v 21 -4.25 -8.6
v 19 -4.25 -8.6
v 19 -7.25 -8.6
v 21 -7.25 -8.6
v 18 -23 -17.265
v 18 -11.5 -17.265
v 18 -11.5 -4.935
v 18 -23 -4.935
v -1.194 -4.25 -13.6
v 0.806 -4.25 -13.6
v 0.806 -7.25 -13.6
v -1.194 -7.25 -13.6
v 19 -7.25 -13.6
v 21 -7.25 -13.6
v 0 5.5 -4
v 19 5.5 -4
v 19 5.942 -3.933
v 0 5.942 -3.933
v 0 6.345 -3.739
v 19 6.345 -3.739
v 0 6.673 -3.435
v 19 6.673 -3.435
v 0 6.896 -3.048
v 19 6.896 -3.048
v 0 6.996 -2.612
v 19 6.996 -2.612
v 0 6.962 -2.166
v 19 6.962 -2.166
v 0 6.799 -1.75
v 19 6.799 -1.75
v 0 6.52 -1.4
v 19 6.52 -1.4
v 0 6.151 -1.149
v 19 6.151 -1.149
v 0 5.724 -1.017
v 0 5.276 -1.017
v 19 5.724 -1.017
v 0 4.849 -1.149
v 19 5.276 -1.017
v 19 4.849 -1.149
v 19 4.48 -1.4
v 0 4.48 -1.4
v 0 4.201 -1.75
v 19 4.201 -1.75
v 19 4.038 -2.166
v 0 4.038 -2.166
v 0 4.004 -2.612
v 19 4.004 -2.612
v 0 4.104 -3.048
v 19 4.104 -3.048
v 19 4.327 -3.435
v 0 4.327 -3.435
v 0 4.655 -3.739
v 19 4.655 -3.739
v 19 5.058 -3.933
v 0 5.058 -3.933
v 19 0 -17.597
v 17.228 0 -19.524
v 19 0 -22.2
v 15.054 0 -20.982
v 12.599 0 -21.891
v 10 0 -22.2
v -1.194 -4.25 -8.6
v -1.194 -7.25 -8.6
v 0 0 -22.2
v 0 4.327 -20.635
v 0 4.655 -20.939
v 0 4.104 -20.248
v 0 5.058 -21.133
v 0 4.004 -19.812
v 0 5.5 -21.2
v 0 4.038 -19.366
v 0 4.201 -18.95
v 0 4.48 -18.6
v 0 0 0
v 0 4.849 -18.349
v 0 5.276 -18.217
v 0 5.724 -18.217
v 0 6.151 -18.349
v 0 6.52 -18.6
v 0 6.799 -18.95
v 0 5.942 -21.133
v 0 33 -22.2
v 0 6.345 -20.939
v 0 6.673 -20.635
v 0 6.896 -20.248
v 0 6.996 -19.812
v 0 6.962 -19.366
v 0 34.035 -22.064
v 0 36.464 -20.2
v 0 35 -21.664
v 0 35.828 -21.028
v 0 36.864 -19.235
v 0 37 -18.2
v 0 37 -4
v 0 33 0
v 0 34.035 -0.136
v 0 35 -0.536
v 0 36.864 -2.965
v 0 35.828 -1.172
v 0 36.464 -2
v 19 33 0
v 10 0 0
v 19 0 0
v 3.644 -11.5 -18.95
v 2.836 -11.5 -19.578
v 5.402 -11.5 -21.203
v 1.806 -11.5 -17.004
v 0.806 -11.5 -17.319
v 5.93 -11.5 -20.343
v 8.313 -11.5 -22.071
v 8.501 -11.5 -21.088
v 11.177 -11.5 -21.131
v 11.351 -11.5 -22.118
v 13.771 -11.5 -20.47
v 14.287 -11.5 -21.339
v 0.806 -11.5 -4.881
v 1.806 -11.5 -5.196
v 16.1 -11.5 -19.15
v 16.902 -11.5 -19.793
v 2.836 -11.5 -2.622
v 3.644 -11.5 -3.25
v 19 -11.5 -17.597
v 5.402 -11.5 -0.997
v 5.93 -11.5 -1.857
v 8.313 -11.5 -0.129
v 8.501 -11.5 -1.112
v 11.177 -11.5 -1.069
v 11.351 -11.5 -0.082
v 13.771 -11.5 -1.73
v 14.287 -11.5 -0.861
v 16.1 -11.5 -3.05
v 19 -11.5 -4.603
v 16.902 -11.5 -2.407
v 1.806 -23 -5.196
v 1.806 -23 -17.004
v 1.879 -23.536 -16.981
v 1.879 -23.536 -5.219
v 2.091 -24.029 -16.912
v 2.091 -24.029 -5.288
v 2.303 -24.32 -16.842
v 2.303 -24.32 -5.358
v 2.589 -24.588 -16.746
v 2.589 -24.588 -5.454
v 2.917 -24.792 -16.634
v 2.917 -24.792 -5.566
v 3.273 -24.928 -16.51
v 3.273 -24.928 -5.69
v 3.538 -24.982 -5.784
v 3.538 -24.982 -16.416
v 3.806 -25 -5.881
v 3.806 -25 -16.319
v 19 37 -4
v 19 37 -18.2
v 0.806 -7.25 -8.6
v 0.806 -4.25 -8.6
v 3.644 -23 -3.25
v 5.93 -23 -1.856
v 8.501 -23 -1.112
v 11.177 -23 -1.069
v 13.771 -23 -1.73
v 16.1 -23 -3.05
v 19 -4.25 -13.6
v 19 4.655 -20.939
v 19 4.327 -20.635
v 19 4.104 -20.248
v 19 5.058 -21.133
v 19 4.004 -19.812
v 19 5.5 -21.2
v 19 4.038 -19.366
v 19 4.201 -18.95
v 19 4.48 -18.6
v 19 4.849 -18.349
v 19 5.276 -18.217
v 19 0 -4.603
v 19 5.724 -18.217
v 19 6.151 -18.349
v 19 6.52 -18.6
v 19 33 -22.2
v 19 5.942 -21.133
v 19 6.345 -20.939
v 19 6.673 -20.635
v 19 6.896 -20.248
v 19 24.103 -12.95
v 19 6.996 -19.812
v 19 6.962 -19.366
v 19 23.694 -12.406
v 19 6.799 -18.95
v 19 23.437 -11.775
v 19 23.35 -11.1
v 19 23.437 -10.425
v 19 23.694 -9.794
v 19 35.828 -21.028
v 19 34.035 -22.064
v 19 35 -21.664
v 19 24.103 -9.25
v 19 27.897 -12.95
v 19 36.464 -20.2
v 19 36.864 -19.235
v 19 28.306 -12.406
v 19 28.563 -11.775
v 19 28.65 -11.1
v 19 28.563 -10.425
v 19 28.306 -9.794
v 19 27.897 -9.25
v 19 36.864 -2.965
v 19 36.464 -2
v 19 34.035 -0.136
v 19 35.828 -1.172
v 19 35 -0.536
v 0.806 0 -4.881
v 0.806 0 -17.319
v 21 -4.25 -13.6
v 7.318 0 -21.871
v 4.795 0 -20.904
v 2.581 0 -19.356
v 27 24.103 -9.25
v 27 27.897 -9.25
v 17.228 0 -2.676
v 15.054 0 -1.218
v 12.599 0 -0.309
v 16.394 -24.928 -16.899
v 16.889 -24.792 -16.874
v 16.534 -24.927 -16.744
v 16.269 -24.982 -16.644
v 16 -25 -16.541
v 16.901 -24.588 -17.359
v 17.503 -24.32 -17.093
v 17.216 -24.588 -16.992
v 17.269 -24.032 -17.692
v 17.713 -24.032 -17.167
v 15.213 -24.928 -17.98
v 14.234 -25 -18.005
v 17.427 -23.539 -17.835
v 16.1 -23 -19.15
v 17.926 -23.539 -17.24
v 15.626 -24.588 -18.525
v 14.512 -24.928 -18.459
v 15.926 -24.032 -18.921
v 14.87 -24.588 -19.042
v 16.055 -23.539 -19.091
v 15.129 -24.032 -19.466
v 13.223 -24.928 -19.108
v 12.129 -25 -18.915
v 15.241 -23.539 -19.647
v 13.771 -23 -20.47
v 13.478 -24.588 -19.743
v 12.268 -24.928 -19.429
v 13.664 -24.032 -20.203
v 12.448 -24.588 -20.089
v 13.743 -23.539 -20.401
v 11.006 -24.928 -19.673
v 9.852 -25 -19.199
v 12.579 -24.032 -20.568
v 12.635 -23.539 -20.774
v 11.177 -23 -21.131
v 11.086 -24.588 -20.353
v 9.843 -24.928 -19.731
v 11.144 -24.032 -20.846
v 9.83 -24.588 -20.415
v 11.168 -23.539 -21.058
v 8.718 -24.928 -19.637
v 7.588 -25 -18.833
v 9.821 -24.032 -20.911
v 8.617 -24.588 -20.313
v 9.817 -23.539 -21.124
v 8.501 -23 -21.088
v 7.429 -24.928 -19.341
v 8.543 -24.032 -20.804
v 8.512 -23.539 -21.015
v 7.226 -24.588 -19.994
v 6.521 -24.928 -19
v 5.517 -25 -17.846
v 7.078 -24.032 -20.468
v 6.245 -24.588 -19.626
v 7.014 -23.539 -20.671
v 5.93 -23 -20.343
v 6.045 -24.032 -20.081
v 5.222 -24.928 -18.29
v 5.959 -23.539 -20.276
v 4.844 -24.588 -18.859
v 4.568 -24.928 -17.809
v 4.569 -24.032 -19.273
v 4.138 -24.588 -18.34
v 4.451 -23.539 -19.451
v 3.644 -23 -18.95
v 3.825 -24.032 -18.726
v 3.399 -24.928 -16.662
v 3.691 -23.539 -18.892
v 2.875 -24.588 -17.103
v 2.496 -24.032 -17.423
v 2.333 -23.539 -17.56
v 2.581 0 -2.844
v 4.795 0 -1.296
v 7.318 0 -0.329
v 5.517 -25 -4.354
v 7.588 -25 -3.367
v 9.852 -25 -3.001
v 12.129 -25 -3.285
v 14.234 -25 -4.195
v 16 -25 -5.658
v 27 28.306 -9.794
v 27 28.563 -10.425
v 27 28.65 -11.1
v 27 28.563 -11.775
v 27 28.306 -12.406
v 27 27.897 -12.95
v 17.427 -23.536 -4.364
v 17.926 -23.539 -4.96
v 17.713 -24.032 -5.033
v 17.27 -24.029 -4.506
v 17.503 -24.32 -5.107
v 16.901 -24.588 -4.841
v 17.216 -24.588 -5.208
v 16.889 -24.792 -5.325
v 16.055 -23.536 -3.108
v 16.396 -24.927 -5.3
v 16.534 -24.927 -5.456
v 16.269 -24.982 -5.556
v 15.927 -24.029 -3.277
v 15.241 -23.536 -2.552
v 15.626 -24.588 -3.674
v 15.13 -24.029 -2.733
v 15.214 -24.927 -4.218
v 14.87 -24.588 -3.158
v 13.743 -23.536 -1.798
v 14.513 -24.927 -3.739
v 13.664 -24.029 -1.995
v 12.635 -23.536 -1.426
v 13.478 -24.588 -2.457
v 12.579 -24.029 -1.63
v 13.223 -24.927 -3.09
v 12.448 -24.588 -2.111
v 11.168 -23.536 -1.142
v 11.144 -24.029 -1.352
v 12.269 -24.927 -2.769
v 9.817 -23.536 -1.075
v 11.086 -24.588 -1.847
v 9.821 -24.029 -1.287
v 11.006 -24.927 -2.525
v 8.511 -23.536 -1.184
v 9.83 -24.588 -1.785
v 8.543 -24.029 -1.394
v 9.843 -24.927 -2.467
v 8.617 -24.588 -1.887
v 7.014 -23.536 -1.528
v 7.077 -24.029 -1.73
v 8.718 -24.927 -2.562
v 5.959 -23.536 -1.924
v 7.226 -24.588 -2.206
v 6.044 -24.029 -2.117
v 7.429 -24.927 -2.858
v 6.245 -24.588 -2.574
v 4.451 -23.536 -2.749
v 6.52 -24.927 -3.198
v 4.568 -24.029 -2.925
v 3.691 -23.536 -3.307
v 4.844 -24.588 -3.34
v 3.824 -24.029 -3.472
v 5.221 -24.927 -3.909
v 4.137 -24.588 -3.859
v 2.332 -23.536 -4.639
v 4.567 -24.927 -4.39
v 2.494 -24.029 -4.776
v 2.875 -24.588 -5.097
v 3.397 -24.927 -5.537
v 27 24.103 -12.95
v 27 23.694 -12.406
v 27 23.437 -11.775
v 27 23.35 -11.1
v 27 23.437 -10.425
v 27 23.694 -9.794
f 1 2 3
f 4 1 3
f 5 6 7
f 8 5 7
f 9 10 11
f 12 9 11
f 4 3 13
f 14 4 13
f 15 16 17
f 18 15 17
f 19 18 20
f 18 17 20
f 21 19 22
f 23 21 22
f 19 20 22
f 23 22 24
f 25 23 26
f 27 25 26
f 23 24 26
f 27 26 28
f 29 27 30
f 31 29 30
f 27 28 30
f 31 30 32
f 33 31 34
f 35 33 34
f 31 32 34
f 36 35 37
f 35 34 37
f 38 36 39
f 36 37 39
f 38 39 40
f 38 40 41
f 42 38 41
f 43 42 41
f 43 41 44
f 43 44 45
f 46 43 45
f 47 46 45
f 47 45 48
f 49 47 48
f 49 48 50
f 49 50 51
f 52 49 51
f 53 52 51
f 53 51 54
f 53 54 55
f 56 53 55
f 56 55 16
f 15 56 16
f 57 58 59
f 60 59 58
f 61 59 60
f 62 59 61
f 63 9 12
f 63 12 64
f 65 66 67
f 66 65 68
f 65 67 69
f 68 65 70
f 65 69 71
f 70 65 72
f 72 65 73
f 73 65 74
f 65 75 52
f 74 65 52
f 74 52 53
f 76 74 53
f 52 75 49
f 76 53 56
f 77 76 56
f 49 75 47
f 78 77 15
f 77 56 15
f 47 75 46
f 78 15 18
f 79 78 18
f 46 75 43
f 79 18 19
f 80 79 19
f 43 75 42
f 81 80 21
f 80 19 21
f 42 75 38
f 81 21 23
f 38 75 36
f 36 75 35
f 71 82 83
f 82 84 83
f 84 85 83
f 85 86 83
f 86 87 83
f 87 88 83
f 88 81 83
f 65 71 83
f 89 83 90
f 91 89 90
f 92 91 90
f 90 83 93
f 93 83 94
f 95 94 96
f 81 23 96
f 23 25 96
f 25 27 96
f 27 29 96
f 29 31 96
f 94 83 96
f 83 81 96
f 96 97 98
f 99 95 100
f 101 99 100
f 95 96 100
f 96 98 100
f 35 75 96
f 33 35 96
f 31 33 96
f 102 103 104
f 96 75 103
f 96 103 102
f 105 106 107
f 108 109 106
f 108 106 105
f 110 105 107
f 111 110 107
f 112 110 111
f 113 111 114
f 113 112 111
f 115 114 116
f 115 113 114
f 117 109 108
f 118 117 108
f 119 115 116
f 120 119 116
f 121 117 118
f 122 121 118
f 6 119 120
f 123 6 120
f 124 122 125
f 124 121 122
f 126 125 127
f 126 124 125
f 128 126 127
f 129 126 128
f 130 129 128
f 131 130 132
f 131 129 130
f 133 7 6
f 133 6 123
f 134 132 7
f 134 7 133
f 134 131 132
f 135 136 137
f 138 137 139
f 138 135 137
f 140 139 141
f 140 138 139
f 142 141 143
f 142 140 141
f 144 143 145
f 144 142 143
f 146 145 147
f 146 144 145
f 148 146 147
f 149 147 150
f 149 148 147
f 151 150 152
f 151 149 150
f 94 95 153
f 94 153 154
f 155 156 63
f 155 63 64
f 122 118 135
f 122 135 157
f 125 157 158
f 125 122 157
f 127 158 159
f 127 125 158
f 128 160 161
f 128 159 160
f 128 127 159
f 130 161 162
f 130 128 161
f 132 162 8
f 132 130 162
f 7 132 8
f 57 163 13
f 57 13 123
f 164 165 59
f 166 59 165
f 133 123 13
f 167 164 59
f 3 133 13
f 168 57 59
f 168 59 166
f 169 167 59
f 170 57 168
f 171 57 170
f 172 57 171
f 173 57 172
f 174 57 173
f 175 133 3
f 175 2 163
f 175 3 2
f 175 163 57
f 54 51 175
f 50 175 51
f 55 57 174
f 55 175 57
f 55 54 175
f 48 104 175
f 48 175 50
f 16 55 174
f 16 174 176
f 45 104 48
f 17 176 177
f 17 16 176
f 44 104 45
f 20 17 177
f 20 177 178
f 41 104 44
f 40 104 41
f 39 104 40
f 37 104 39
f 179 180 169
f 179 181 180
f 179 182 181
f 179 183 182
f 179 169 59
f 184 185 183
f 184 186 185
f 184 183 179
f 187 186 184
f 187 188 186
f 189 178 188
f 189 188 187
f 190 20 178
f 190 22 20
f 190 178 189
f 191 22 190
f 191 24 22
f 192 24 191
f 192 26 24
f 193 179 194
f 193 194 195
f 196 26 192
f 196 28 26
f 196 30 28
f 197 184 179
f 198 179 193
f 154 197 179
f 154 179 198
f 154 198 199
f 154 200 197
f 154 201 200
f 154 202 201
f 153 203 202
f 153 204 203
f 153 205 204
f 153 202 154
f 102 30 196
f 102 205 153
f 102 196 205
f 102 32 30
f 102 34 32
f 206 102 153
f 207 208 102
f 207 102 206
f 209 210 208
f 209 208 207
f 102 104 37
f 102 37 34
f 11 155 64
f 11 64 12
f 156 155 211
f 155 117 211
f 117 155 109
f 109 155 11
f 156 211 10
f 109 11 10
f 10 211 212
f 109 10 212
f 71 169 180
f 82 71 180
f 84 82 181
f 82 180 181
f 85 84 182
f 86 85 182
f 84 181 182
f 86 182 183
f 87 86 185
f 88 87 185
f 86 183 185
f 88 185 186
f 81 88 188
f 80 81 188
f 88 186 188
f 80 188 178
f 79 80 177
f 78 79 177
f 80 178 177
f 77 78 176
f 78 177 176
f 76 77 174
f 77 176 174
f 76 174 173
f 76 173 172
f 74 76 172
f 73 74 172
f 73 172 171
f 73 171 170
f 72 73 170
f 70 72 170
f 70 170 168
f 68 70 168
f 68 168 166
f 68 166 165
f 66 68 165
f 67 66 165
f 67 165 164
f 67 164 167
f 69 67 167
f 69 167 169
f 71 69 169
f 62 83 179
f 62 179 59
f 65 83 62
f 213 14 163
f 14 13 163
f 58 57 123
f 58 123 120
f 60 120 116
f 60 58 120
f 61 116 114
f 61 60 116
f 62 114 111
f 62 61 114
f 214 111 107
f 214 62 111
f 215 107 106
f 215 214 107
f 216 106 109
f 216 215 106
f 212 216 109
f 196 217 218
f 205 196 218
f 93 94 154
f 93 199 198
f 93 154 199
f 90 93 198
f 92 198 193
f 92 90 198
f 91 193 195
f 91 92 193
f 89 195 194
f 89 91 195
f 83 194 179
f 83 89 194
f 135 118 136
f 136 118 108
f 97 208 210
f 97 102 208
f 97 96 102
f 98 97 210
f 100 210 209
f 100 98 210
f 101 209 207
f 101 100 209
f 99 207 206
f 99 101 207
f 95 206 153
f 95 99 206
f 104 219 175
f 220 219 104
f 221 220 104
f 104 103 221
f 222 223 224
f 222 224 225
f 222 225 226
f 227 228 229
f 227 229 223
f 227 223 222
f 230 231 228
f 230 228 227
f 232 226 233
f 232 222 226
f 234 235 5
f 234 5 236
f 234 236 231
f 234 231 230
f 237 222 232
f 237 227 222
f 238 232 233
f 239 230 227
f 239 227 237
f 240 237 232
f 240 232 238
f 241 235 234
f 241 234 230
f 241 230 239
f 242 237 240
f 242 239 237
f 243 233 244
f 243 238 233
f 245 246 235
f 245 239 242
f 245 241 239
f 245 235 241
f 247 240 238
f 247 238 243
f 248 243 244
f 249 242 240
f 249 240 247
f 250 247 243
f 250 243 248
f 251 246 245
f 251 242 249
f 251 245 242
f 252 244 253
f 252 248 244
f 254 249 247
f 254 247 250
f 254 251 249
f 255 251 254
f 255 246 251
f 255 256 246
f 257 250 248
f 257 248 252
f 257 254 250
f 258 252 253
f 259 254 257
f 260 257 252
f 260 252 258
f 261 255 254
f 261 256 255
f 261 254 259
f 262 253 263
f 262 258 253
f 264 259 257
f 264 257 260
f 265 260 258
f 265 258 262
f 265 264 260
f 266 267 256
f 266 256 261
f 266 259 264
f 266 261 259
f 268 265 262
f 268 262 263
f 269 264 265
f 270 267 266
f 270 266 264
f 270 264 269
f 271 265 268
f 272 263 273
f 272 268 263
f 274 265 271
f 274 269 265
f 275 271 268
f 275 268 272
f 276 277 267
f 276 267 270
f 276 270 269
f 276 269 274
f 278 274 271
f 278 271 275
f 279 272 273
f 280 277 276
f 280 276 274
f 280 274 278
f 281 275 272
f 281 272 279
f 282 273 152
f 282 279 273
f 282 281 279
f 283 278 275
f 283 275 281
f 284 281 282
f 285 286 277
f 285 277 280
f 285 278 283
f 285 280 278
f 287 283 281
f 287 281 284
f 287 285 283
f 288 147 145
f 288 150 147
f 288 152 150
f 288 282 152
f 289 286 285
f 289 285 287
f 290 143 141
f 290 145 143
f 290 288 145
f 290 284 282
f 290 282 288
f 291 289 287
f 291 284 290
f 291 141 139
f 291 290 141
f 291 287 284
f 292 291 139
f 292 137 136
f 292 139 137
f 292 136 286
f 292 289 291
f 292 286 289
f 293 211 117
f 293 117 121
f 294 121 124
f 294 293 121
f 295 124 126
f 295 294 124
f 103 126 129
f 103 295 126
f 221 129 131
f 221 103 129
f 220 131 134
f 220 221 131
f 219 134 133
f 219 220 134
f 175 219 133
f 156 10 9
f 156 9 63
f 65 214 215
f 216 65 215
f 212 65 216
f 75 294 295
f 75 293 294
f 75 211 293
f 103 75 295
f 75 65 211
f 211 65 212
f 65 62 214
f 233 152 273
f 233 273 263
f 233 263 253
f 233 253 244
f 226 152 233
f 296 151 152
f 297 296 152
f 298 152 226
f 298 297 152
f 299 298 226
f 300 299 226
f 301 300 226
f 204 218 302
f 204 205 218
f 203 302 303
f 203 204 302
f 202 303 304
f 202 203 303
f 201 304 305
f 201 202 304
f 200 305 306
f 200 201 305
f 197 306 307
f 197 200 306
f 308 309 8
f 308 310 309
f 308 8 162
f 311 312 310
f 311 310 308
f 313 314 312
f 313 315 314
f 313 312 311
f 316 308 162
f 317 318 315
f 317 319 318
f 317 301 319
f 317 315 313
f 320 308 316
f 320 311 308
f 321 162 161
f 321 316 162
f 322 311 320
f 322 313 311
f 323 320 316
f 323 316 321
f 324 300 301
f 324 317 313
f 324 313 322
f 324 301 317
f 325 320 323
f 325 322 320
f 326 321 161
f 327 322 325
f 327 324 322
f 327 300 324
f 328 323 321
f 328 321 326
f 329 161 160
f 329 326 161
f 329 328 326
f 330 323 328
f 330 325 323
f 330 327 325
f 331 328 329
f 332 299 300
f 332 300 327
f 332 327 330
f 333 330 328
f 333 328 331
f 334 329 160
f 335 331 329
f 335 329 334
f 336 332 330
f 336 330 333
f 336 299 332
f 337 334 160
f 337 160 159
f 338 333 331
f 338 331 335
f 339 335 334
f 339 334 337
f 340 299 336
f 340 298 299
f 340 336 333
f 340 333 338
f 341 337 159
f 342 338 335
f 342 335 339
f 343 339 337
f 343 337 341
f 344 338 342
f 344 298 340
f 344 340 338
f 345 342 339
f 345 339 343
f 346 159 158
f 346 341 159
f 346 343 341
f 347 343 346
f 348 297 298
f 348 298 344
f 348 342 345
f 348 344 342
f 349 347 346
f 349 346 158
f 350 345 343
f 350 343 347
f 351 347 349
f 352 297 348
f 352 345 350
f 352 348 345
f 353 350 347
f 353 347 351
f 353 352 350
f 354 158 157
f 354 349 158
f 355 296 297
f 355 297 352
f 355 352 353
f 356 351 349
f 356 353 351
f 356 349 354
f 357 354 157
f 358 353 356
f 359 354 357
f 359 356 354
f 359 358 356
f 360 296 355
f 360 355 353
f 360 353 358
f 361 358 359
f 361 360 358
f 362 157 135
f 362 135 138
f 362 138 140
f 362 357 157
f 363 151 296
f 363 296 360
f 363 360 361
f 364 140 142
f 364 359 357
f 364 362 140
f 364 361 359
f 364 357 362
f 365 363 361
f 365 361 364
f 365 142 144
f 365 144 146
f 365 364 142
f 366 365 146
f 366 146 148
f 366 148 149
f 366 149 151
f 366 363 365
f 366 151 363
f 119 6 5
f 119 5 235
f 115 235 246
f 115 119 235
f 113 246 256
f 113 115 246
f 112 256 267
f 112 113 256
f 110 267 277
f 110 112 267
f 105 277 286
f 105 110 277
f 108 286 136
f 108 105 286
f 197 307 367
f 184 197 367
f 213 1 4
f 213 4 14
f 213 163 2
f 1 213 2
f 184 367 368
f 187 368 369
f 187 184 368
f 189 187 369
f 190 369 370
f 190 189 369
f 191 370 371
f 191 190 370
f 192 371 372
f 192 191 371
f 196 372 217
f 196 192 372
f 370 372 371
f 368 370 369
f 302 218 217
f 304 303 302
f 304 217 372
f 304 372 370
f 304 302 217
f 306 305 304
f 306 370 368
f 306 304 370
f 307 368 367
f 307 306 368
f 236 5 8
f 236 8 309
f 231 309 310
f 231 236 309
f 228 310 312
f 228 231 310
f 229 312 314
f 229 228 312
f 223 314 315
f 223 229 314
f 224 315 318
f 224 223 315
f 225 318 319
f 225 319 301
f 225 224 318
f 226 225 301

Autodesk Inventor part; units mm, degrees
ref_plane "YZ Plane" through (0, 0, 0) normal (1, 0, 0) x (0, 1, 0)
ref_plane "XZ Plane" through (0, 0, 0) normal (0, 1, 0) x (-1, 0, 0)
ref_plane "XY Plane" through (0, 0, 0) normal (0, 0, 1) x (1, 0, 0)
sketch "Sketch1" plane through (0, 0, 0) normal (1, 0, 0) x (0, 1, 0)
  line L0 (0, 0) -> (33, 0)
  line L1 (37, -4) -> (37, -18.2)
  line L2 (33, -22.2) -> (0, -22.2)
  line L3 (0, -22.2) -> (0, 0)
  arc A0 (33, -22.2) -> (37, -18.2) centre (33, -18.2) ccw
  arc A1 (37, -4) -> (33, 0) centre (33, -4) ccw
extrude "Extrusion1" add sketch "Sketch1" along normal blind 19
sketch "Sketch2" plane through (19, 0, 0) normal (1, 0, 0) x (0, 0, -1)
  line L0 (0, 33) -> (0, 0) projected
  line L1 (22.2, 37) -> (0, 37)
  line L2 (0, 37) -> (0, 26)
  line L3 (22.2, 26) -> (22.2, 37)
  line L4 (0, 31.5) -> (0, 26)
  circle A0 centre (11.1, 26) radius 2.65
  dimension "d9" = 11
  dimension "d11" = 5.3
extrude "Extrusion2" add sketch "Sketch2" along normal blind 8
sketch "Sketch3" plane through (27, 26, -11.1) normal (1, 0, 0) x (0, 0, -1)
  line L0 (1.85, 0) -> (1.85, -3.8405)
  line L1 (1.85, -3.8405) -> (0, -3.8405)
  line L2 (1.85, -3.8405) -> (-1.85, -3.8405)
  line L3 (-1.85, -3.8405) -> (-1.85, 4.0175)
  line L4 (-1.85, 4.0175) -> (1.85, 4.0175)
  line L5 (1.85, 4.0175) -> (1.85, -3.8405)
  line L6 (1.85, 4.0175) -> (3.7589, 4.0175)
  line L7 (3.7589, 4.0175) -> (3.7589, -3.8405)
  line L8 (3.7589, -3.8405) -> (1.85, -3.8405)
  line L9 (1.85, -3.8405) -> (1.85, 4.0175)
  line L10 (-1.85, 4.0175) -> (-3.5435, 4.0175)
  line L11 (-3.5435, 4.0175) -> (-3.5435, -3.8405)
  line L12 (-3.5435, -3.8405) -> (-1.85, -3.8405)
  line L13 (-1.85, -3.8405) -> (-1.85, 4.0175)
  point P0 (-11.1, -26)
  dimension "d14" = 1.85
  dimension "d15" = 3.7
extrude "Extrusion3" cut sketch "Sketch3" against normal blind 8 contours L5 L6 L7 L8 L0 | L3 L12 L11 L10
sketch "Sketch4" plane through (19, 0, 0) normal (1, 0, 0) x (0, 0, -1)
  line L0 (0, 0) -> (22.2, 0) projected
  line L1 (0, 0) -> (22.2, 0)
  line L2 (22.2, 0) -> (22.2, 5.5)
  line L3 (0, 5.5) -> (0, 0)
  circle A0 centre (2.5, 5.5) radius 1.5
  circle A1 centre (19.7, 5.5) radius 1.5
  dimension "d18" = 5.5
  dimension "d20" = 3
  dimension "d22" = 3
extrude "Extrusion4" cut sketch "Sketch4" against normal blind 20
sketch "Sketch5" plane through (0, 0, -22.2) normal (0, -1, 0) x (1, 0, 0)
  line L0 (0, 22.2) -> (19, 22.2) projected
  line L1 (0, 0) -> (19, 0) projected
  line L2 (19, 18.2) -> (19, 22.2) projected
  line L3 (19, 22.2) -> (10, 22.2)
  line L4 (18, 0) -> (19, 0)
  line L5 (19, 4.6031) -> (19, 17.5969)
  line L6 (0.8056, 17.3188) -> (0.8056, 4.8812)
  arc A0 (0.8056, 4.8812) -> (19, 4.6031) centre (10, 11.1) ccw
  arc A1 (19, 17.5969) -> (0.8056, 17.3188) centre (10, 11.1) ccw
  arc A2 (1.8056, 5.1956) -> (18, 4.9348) centre (10, 11.1) ccw
  arc A3 (18, 17.2652) -> (1.8056, 17.0044) centre (10, 11.1) ccw
  line L7 (1.8056, 17.0044) -> (1.8056, 5.1956)
  line L8 (0.8056, 4.8812) -> (0.8056, 17.3188)
  line L9 (18, 17.2652) -> (18, 4.9348)
  line L10 (19, 4.6031) -> (19, 17.5969)
extrude "Extrusion5" add sketch "Sketch5" along normal blind 11.5
sketch "Sketch6" plane through (18, 0, -17.2652) normal (0, -1, 0) x (1, 0, 0)
  line L0 (-16.1944, 12.0697) -> (-16.1944, 0.2608) projected
  arc A0 (-16.1944, 0.2608) -> (0, 0) centre (-8, 6.1652) ccw projected
  line L1 (0, 0) -> (0, 12.3305) projected
  arc A1 (0, 12.3305) -> (-16.1944, 12.0697) centre (-8, 6.1652) ccw projected
  line L2 (-16.1944, 12.0697) -> (-16.1944, 0.2608) projected
  arc A2 (-16.1944, 0.2608) -> (0, 0) centre (-8, 6.1652) ccw projected
  line L3 (0, 0) -> (0, 12.3305) projected
  arc A3 (0, 12.3305) -> (-16.1944, 12.0697) centre (-8, 6.1652) ccw projected
  point P0 (-18, 17.2652)
extrude "Extrusion6" add sketch "Sketch6" along normal blind 25
fillet "Fillet1" radius 2 4 edges at (18, -25, -11.1) (9.8374, -25, -21.1987) (1.8056, -25, -11.1) (9.8374, -25, -1.0013)
sketch "Sketch7" plane through (19, 0, 0) normal (1, 0, 0) x (0, 0, -1)
  line L0 (4.6031, 0) -> (4.6031, -11.5) projected
  line L1 (17.5969, 0) -> (17.5969, -11.5) projected
  line L2 (22.2, 0) -> (0, 0) projected
  line L3 (13.6, -4.25) -> (8.6, -4.25)
  line L4 (8.6, -4.25) -> (8.6, -7.25)
  line L5 (8.6, -7.25) -> (13.6, -7.25)
  line L6 (13.6, -7.25) -> (13.6, -4.25)
  line L7 (13.6, -4.25) -> (8.6, -7.25) construction
  line L8 (8.6, -4.25) -> (13.6, -7.25) construction
  dimension "d33" = 5
  dimension "d34" = 3
extrude "Extrusion7" add sketch "Sketch7" along normal blind 2
sketch "Sketch8" plane through (0.8056, 0, -17.3188) normal (-1, 0, 0) x (0, 0, 1)
  line L0 (-4.8812, 0) -> (17.3188, 0) projected
  line L1 (3.7188, -4.25) -> (3.7188, -7.25) projected
  line L2 (8.7188, -7.25) -> (3.7188, -7.25)
  line L3 (3.7188, -7.25) -> (3.7188, -4.25)
  line L4 (3.7188, -4.25) -> (8.7188, -4.25)
  line L5 (8.7188, -4.25) -> (8.7188, -7.25)
  line L6 (8.7188, -7.25) -> (3.7188, -4.25) construction
  line L7 (3.7188, -7.25) -> (8.7188, -4.25) construction
  point P0 (6.2188, -5.75)
extrude "Extrusion8" add sketch "Sketch8" along normal blind 2
scale "Scale1" factors (2, 2, 2) then translate (-19, -12.75, 11.1) bodies 1
scale "Scale2" factors (0.5, 0.5, 0.5) then translate (9.5, 6.375, -5.55) bodies 1
properties part number "DCMotor"
